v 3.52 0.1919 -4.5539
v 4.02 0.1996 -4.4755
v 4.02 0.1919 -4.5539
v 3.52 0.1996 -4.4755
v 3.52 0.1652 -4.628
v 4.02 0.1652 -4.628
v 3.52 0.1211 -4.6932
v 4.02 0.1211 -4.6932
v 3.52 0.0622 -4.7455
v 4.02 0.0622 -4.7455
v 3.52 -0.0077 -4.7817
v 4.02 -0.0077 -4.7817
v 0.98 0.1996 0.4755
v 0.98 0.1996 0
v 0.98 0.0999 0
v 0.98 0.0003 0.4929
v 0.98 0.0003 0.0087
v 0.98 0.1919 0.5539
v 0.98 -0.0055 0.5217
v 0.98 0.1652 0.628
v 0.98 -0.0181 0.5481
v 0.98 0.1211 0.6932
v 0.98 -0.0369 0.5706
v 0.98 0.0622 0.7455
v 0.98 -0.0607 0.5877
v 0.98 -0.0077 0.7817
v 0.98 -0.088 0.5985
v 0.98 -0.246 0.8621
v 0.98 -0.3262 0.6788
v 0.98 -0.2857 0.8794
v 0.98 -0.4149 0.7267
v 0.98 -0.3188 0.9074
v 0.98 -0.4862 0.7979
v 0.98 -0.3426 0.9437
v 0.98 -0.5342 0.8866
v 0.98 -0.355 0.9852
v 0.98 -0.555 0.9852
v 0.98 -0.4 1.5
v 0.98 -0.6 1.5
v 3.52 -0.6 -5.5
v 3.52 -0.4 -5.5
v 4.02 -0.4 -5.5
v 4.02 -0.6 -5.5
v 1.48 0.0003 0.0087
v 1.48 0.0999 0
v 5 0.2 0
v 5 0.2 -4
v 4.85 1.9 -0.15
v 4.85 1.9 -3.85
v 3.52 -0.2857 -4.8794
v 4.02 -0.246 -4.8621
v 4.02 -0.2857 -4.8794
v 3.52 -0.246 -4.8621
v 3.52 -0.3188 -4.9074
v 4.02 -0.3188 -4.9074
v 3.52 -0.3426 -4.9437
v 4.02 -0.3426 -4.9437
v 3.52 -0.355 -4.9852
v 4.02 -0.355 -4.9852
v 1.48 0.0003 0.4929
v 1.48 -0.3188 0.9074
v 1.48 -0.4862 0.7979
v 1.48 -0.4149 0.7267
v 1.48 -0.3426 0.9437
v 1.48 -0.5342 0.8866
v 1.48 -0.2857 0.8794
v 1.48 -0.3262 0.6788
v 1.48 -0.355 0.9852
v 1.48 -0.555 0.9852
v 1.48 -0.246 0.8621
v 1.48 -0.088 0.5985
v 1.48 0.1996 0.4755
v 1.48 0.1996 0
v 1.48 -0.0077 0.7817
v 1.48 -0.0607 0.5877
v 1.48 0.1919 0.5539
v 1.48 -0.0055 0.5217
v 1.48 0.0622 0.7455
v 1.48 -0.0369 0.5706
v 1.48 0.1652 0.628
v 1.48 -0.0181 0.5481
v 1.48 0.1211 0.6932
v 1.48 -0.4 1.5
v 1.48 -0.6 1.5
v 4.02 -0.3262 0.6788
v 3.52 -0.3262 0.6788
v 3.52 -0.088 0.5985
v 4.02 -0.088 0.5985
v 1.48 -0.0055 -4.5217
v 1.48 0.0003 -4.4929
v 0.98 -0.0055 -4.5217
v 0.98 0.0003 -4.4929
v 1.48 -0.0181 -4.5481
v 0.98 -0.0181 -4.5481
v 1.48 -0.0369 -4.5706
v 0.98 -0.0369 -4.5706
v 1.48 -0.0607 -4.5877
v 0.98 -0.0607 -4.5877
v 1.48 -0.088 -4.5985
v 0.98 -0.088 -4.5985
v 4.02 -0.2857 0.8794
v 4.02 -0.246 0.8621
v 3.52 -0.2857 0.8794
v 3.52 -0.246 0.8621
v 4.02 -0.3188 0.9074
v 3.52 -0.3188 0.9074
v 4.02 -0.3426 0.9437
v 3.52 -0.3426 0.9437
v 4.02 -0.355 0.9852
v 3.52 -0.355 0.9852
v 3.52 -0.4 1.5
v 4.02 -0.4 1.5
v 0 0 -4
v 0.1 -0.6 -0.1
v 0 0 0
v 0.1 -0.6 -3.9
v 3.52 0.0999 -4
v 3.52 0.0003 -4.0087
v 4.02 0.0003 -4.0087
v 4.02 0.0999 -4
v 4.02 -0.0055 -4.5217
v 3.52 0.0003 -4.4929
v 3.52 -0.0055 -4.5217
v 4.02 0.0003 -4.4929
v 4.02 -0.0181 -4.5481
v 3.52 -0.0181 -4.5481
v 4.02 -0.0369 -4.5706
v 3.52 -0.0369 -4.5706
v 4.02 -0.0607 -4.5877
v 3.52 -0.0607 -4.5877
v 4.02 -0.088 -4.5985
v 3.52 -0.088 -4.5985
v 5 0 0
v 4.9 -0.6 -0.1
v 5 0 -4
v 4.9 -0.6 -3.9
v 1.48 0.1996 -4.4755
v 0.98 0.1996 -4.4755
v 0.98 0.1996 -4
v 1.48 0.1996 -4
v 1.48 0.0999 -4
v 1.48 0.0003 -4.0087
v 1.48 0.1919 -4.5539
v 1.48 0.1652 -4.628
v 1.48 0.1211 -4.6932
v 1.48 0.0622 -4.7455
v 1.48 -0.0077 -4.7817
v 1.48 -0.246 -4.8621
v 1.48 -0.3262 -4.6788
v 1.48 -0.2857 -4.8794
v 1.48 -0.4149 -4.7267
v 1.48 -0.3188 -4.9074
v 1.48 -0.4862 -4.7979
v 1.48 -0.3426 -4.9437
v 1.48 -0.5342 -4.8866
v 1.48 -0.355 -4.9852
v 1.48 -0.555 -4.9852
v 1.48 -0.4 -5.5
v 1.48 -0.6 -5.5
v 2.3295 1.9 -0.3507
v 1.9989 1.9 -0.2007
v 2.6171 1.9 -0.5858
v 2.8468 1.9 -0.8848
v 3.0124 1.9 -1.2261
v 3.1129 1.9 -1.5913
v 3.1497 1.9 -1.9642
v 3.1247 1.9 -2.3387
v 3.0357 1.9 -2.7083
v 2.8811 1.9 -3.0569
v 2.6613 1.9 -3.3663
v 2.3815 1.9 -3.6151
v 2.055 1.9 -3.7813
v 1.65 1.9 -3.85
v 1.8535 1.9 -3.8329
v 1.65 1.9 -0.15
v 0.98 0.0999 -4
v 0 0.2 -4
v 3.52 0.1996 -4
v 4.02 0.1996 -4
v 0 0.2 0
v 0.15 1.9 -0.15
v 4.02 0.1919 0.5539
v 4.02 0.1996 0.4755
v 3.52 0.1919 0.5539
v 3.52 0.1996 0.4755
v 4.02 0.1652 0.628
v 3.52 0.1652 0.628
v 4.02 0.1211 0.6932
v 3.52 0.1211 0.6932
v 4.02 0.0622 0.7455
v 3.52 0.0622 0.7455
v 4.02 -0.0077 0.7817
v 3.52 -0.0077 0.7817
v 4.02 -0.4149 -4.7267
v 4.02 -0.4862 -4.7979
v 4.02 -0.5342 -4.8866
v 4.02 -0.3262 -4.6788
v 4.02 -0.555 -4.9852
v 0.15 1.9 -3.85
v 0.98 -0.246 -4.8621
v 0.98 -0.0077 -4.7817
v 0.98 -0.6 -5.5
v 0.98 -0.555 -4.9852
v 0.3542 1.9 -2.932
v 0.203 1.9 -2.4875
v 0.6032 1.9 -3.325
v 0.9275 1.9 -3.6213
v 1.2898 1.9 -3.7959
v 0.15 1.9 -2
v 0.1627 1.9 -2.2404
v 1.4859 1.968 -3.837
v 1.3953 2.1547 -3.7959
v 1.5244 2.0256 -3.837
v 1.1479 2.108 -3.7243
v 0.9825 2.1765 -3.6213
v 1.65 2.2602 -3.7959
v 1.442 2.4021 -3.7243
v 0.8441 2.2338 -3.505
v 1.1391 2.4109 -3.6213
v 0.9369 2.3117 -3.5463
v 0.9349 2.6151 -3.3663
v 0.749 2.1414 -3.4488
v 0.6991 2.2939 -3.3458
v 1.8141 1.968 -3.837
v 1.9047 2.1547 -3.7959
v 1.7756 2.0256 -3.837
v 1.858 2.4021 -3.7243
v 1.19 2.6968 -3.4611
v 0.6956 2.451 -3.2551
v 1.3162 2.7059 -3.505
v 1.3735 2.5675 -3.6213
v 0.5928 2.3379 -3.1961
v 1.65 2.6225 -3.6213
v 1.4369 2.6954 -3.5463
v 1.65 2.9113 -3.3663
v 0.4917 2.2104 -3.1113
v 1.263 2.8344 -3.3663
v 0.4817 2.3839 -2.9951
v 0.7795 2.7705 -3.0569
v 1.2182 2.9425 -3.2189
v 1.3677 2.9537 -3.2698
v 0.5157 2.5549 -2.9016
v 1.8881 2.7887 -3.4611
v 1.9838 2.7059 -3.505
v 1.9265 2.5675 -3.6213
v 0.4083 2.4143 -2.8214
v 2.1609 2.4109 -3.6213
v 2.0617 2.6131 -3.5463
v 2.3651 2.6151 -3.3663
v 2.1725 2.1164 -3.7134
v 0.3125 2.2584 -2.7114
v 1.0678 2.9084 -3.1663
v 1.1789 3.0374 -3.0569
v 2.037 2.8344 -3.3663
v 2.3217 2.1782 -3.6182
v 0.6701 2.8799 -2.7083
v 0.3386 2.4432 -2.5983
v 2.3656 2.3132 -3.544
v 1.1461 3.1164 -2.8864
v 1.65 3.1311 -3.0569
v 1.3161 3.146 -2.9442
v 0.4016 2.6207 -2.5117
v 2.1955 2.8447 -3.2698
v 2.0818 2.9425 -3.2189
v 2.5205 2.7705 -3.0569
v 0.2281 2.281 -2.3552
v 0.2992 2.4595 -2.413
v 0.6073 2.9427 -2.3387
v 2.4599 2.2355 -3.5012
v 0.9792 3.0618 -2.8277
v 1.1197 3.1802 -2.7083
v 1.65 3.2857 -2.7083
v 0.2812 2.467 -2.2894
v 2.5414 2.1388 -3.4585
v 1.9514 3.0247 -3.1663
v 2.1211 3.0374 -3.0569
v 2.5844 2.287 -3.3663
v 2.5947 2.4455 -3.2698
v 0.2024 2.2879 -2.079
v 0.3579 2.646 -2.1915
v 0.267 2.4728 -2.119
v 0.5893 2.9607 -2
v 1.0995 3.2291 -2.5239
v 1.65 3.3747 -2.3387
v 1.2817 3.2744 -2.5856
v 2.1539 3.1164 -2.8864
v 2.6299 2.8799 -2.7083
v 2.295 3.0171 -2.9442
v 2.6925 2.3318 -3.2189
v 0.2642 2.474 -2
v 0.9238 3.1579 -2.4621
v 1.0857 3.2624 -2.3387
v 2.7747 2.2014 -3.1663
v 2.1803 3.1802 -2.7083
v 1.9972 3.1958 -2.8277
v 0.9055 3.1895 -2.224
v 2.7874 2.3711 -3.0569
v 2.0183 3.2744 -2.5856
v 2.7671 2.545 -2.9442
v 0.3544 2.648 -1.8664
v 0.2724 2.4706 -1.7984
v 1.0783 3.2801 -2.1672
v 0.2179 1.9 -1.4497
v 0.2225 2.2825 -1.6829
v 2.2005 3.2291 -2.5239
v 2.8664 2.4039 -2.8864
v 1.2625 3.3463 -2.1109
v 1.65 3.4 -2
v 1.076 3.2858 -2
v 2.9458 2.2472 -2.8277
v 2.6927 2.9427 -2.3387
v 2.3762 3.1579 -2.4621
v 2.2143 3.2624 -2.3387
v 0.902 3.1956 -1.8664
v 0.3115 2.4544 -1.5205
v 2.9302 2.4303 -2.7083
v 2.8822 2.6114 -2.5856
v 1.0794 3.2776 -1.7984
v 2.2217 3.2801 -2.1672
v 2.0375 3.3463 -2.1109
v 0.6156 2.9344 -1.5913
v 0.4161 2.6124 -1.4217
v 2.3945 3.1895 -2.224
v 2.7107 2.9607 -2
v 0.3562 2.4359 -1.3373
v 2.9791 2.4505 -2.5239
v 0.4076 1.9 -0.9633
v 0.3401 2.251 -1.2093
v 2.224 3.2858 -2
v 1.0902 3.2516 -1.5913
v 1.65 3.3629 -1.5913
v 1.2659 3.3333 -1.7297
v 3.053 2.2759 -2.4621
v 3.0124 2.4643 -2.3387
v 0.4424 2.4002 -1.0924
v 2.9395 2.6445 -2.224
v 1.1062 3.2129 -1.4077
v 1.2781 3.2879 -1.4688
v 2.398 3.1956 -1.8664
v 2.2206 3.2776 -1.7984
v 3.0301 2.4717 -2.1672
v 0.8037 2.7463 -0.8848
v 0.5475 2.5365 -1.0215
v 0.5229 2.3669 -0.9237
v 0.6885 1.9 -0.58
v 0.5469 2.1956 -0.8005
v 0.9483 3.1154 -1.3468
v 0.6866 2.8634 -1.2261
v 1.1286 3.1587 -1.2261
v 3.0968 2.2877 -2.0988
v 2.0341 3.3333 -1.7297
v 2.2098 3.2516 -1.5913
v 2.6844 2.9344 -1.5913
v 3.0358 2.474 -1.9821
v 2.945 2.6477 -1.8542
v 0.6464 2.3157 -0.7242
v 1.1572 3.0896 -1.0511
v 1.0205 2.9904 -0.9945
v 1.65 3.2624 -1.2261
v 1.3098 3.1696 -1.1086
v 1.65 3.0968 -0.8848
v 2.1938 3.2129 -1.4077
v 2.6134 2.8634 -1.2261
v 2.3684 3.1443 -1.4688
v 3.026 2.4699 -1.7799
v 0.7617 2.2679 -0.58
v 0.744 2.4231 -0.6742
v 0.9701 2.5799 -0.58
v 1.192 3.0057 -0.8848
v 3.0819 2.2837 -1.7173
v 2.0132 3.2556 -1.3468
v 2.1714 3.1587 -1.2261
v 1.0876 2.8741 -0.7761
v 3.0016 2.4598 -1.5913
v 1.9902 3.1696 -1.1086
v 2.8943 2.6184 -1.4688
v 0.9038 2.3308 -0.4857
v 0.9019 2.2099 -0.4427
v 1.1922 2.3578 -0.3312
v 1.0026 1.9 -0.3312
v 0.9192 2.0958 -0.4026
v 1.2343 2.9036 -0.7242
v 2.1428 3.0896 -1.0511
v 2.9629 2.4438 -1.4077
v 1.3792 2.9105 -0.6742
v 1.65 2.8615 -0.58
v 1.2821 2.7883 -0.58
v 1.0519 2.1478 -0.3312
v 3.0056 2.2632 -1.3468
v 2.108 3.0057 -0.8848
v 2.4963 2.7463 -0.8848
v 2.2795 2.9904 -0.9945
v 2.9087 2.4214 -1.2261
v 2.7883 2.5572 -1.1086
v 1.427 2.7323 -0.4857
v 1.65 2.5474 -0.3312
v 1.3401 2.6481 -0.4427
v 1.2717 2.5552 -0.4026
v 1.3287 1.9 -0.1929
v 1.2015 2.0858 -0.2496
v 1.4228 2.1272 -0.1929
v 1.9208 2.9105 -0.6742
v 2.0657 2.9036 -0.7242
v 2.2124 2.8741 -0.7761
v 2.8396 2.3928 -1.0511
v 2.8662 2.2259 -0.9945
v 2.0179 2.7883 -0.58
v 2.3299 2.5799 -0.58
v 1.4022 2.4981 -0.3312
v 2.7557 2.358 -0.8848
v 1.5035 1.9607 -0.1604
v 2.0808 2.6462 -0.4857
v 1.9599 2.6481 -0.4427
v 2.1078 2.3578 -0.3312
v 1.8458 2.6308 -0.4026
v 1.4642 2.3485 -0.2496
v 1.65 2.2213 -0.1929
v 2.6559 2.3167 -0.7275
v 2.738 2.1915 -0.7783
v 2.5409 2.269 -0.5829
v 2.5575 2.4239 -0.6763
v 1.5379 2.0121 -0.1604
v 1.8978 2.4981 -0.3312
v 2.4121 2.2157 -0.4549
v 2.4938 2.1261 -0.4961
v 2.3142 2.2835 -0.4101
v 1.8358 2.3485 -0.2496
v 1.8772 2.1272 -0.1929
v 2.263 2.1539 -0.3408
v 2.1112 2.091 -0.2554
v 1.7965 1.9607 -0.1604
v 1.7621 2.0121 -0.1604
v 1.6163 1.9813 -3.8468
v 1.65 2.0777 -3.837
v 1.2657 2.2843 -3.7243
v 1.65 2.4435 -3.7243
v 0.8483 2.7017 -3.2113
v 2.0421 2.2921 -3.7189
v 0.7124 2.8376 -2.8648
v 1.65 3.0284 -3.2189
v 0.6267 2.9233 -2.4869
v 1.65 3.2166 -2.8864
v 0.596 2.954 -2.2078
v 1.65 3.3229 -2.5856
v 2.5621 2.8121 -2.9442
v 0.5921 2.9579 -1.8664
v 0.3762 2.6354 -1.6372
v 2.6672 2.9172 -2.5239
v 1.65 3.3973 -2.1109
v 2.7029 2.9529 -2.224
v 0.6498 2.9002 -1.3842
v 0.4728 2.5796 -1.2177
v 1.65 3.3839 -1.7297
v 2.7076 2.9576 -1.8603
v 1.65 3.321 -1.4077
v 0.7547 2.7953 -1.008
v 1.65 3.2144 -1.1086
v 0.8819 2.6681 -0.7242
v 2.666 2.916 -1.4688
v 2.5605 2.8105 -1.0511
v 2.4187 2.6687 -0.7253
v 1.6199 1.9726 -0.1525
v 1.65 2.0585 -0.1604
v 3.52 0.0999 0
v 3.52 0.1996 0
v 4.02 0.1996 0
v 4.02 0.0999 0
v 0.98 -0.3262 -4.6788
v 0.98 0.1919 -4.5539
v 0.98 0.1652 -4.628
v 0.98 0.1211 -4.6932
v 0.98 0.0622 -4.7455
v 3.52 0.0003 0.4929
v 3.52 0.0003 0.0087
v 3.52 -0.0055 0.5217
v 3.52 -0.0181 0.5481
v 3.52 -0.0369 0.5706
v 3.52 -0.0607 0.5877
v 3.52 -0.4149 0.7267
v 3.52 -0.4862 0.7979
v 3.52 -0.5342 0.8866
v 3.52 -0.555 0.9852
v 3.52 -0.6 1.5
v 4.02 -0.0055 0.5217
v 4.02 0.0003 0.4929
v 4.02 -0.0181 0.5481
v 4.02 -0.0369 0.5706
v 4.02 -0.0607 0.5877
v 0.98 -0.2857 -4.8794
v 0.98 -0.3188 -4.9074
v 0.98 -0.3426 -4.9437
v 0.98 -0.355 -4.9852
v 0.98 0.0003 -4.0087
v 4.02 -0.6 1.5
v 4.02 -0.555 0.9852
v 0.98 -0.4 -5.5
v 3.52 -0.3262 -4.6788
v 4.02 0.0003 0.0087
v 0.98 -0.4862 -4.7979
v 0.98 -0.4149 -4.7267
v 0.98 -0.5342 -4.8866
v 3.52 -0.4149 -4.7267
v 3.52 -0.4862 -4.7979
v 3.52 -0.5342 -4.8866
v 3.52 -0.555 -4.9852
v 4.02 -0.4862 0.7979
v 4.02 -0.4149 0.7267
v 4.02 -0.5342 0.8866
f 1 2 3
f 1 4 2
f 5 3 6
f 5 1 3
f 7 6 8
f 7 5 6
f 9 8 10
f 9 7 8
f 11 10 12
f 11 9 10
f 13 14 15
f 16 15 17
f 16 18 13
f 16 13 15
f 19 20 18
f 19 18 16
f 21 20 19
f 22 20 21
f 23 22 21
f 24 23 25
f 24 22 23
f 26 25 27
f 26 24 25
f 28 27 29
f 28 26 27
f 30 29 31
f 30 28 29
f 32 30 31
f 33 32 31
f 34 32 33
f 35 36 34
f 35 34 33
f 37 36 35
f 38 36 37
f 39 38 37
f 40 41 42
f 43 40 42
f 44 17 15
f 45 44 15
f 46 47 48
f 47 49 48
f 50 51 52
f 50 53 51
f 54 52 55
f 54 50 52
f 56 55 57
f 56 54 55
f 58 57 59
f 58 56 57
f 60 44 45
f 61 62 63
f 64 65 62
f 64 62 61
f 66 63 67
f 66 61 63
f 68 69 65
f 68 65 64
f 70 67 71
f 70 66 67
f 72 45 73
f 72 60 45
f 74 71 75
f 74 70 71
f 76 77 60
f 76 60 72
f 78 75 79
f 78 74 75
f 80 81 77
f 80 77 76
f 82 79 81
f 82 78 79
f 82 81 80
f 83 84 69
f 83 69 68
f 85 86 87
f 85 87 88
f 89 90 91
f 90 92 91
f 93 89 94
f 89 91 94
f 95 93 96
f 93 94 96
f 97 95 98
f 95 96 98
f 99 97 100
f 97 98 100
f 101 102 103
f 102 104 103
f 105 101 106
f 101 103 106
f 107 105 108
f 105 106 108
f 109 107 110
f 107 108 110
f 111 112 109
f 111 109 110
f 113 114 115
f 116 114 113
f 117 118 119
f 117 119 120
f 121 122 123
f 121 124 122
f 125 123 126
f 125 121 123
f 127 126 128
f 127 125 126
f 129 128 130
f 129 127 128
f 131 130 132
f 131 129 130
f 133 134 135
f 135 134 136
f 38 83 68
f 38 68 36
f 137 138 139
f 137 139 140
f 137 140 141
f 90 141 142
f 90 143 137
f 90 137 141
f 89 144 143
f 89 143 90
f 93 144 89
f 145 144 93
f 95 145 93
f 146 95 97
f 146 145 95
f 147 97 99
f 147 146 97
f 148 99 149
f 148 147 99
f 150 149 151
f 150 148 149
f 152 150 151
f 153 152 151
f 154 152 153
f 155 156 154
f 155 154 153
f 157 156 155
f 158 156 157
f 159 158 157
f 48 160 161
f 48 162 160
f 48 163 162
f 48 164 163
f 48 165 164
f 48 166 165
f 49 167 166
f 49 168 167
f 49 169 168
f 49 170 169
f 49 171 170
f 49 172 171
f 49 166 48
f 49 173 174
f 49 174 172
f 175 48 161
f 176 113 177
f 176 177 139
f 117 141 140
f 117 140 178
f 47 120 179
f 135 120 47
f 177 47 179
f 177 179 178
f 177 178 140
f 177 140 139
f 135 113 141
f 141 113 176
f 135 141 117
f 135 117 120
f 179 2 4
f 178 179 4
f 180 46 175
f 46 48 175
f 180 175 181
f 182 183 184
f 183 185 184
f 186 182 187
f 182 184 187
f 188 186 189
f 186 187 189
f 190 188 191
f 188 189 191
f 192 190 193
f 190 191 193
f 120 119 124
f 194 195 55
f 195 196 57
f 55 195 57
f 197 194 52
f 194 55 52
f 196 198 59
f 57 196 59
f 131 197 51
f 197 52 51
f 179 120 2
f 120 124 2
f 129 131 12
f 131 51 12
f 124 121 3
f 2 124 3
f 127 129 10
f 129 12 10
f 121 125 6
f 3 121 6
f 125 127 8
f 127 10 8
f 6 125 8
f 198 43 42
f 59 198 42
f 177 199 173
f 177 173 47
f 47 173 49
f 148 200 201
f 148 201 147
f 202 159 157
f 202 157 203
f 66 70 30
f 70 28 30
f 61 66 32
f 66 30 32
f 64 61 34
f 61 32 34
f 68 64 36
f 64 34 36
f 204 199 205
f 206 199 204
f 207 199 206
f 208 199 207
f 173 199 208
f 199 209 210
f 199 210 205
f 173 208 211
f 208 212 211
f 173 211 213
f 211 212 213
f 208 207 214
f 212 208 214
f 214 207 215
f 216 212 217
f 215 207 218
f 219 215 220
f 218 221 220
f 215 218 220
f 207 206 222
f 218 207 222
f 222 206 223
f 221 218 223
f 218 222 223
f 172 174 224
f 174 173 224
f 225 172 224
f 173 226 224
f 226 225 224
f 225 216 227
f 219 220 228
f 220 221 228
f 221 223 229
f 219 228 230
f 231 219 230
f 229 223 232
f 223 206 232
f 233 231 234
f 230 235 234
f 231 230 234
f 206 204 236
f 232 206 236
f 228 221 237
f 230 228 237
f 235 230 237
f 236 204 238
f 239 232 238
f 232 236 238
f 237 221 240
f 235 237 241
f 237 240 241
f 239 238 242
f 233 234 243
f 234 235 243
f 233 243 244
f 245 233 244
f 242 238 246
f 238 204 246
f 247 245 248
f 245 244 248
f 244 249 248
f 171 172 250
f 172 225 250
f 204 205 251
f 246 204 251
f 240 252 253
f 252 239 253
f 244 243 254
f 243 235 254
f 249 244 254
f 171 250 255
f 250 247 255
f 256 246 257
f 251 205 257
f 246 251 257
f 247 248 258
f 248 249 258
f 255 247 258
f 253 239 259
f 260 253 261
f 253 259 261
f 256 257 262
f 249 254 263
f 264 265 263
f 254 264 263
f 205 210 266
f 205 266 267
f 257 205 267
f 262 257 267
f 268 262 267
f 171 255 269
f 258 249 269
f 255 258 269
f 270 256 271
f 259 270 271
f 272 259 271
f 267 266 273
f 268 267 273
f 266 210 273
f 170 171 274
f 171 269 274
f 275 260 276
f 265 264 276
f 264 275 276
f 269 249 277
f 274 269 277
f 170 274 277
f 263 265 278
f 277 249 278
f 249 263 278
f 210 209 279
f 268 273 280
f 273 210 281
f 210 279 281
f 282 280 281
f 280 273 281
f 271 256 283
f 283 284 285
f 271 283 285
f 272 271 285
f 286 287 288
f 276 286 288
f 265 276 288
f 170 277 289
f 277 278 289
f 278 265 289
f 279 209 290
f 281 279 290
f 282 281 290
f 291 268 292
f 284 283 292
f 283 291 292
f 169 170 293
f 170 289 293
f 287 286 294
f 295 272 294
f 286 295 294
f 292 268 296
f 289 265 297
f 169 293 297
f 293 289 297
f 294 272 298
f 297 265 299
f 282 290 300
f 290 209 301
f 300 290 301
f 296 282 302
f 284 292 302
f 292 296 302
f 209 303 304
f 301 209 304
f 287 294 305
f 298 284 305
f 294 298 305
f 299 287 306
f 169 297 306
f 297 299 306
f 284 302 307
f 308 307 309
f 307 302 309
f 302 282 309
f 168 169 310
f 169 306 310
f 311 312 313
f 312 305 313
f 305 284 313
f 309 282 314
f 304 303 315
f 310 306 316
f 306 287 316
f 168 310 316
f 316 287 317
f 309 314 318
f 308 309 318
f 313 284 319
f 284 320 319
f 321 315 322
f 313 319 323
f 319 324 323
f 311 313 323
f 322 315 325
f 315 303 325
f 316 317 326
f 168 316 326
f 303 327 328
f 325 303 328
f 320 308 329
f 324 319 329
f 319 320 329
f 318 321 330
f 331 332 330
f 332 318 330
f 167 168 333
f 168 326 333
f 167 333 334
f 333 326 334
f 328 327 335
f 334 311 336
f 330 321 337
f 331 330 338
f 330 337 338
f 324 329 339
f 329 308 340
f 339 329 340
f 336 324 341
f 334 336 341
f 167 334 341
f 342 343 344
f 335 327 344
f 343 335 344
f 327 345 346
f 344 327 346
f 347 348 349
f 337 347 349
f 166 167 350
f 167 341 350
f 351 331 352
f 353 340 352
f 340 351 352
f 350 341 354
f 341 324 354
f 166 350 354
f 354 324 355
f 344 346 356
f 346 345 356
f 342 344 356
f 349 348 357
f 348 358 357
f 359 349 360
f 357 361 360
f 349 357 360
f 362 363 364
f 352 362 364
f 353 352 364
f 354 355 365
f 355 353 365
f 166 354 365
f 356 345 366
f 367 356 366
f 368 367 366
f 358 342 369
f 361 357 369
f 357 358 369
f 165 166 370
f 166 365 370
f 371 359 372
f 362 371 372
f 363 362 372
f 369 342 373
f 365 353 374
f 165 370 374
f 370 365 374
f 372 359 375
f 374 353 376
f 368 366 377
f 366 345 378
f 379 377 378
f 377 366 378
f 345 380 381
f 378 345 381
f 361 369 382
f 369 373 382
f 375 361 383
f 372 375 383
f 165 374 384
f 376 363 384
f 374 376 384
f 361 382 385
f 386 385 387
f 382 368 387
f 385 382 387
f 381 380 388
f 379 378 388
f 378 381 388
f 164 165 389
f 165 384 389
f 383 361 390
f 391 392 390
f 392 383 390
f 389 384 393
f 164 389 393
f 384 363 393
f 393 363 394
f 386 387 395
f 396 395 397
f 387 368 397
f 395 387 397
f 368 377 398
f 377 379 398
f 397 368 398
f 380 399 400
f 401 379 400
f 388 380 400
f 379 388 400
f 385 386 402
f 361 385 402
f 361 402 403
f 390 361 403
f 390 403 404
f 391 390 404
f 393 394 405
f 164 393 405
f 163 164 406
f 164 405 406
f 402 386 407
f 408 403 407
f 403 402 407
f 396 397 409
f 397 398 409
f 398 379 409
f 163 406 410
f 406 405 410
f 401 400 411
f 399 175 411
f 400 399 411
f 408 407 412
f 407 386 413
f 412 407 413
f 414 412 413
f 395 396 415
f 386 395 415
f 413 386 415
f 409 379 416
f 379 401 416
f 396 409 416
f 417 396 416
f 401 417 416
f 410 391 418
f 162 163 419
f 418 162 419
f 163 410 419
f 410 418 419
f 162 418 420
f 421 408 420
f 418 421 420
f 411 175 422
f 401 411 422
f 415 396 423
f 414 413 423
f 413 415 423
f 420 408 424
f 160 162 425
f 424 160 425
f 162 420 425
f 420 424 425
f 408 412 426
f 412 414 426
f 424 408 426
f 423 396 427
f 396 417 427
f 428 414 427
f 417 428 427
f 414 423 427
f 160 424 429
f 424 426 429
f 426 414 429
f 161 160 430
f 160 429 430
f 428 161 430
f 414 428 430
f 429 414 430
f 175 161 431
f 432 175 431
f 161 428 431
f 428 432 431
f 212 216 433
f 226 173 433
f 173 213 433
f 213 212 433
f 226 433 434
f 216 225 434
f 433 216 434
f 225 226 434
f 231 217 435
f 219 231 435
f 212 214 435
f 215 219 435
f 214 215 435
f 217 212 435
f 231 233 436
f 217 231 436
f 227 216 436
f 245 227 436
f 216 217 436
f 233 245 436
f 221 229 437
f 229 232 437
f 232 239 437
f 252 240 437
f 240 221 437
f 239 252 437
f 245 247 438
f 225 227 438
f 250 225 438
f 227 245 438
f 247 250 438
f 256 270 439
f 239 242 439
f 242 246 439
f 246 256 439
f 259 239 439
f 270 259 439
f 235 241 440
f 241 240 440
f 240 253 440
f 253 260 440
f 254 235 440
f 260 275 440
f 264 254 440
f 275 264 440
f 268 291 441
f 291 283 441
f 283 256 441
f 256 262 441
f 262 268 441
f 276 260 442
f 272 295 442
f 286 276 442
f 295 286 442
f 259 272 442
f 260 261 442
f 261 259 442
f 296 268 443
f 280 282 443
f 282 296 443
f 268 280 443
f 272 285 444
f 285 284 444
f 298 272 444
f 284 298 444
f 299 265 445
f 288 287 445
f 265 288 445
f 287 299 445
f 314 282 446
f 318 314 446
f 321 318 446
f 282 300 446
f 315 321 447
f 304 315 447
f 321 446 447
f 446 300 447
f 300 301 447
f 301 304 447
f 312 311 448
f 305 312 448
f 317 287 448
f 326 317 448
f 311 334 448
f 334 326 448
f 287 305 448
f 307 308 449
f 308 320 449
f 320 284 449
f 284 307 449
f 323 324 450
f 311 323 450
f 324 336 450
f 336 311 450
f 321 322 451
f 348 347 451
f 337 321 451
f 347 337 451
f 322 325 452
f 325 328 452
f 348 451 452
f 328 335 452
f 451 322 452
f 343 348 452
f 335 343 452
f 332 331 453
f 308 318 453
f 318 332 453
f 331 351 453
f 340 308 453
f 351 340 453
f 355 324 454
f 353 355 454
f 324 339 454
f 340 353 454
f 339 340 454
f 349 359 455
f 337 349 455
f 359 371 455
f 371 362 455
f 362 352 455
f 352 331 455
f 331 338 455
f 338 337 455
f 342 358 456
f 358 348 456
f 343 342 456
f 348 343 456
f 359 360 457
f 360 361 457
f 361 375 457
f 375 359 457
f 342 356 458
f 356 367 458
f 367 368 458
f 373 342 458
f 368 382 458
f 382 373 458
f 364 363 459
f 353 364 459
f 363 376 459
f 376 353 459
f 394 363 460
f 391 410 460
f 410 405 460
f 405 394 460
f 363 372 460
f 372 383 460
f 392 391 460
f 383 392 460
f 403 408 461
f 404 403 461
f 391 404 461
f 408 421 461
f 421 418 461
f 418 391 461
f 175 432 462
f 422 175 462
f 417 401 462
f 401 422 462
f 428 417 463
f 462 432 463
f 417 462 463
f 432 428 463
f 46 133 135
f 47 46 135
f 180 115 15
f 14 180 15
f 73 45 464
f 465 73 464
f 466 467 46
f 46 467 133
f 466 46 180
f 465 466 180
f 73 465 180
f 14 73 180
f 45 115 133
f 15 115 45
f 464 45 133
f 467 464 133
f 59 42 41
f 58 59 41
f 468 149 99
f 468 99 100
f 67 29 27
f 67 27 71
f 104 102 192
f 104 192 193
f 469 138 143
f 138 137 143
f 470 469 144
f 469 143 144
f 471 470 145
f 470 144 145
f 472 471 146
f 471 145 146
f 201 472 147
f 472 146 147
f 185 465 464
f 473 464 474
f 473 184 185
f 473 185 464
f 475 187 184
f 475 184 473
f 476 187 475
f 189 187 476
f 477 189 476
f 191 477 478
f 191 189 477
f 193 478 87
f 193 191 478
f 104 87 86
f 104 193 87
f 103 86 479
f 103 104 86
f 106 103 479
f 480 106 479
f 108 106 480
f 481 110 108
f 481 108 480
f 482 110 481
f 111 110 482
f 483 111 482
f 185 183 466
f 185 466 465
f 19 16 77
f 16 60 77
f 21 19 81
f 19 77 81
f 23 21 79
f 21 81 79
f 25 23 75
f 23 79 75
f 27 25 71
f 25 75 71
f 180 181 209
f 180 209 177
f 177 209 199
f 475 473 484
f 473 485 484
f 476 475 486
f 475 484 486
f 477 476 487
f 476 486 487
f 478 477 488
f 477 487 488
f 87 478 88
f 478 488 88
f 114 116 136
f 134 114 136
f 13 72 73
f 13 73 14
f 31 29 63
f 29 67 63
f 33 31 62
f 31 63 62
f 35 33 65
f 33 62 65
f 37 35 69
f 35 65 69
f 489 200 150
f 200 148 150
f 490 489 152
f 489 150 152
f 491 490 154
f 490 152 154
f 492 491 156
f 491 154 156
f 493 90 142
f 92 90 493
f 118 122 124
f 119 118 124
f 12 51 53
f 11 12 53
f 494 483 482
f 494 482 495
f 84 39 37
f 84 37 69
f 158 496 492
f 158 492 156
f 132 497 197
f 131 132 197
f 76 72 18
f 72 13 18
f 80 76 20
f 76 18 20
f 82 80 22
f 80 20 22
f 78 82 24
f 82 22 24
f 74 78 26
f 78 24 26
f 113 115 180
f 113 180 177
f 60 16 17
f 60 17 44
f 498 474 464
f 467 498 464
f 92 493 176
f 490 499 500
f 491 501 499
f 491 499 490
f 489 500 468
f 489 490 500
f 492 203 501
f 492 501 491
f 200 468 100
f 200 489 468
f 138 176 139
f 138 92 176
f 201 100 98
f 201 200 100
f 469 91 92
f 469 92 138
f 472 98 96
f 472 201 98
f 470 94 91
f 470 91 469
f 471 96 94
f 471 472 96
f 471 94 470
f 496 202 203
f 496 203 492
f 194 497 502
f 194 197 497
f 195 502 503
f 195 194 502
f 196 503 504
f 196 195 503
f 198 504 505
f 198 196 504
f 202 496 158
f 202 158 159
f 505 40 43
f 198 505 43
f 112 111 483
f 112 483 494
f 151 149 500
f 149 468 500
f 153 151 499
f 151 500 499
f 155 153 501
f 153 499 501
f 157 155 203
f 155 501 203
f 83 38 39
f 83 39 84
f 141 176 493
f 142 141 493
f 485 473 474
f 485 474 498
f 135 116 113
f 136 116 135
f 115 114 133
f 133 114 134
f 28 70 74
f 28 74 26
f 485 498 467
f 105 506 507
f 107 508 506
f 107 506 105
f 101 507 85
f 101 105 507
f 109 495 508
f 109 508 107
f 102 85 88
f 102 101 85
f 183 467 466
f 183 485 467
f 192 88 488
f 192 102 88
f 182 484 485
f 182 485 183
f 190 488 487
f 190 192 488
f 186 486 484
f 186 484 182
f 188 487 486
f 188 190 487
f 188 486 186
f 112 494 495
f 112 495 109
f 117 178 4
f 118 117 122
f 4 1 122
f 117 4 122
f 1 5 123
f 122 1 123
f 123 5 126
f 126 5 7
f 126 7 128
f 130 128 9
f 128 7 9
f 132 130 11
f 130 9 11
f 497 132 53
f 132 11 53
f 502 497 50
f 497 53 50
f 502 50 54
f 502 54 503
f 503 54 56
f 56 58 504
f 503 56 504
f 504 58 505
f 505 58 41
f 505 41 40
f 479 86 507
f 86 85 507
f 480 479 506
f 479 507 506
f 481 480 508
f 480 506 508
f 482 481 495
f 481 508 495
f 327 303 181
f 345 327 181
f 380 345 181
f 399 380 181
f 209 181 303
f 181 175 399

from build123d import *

# Parameters (mm, degrees)
SKETCH_1_W               = 5
SKETCH_1_H               = 4
EXTRUDE_1_DEPTH          = 0.2
LOFT_3_OUTLINE_W         = 4.8
LOFT_3_OUTLINE_H         = 3.8
LOFT_3_DEPTH             = 0.6
LOFT_3_DRAFT             = -9.4623222
SKETCH_9_W               = 0.5
SKETCH_9_H               = 0.2
PATTERN_LINEAR_1_COUNT   = 2
PATTERN_LINEAR_1_PITCH   = 2.54
MIRROR_1_COPY_1_SKETCH_W = 0.5
MIRROR_1_COPY_1_SKETCH_H = 0.2


# Read off the part's stored shape, not the designer's step: 放样3
with BuildPart() as part:
    # 草图1 → 凸台-拉伸1 (new body)
    with BuildSketch(Plane(origin=(0, 0, 0), x_dir=(1, 0, 0), z_dir=(0, 1, 0))):
        with Locations((2.5, 2)):
            Rectangle(SKETCH_1_W, SKETCH_1_H)
    extrude(amount=EXTRUDE_1_DEPTH)


with BuildPart() as loft_3_tool:
    # 放样3 outline → 放样3 (with draft: the straight prism first)
    with BuildSketch(Plane(origin=(0, -0.6, 0), x_dir=(1, 0, 0), z_dir=(0, 1, 0))):
        with Locations((2.5, 2)):
            Rectangle(LOFT_3_OUTLINE_W, LOFT_3_OUTLINE_H)
    extrude(amount=LOFT_3_DEPTH)
    # 放样3: the draft: its side faces are tilted about the plane it starts from
    loft_3_sides = [loft_3_tool.faces().sort_by_distance(p)[0] for p in [
        (2.5, -0.3, -3.9),
        (0.1, -0.3, -2),
        (2.5, -0.3, -0.1),
        (4.9, -0.3, -2),
    ]]
    draft(loft_3_sides, Plane(origin=(0, -0.6, 0), x_dir=(1, 0, 0), z_dir=(0, 1, 0)), LOFT_3_DRAFT)


with BuildPart() as part_1:
    add(part.part)

    # 放样3: add loft_3_tool
    add(loft_3_tool.part)

    # 草图4 → 放样5 section 0
    with BuildSketch(Plane(origin=(0, 0.2, 0), x_dir=(1, 0, 0), z_dir=(0, 1, 0))):
        with BuildLine():
            Line((0, 4), (5, 4))
            Line((5, 4), (5, 0))
            Line((5, 0), (0, 0))
            Line((0, 0), (0, 4))
        make_face()
    # 草图3 → 放样5 section 1
    with BuildSketch(Plane(origin=(0, 1.9, 0), x_dir=(1, 0, 0), z_dir=(0, 1, 0))):
        with BuildLine():
            Line((0.15, 3.85), (4.85, 3.85))
            Line((4.85, 3.85), (4.85, 0.15))
            Line((4.85, 0.15), (0.15, 0.15))
            Line((0.15, 0.15), (0.15, 3.85))
        make_face()
    loft()

    # 草图6 → 旋转1 (revolve)
    with BuildSketch(Plane(origin=(0, 1.9, 0), x_dir=(1, 0, 0), z_dir=(0, 1, 0))):
        with BuildLine():
            Line((1.65, 3.85), (1.65, 0.15))
            add(Edge.make_bspline(
                [(1.65, 3.85), (0.15, 3.85), (0.15, 2), (0.15, 0.15), (1.65, 0.15)],
                knots=[0, 0, 0, 1.570796327, 1.570796327, 3.141592654, 3.141592654, 3.141592654], degree=2, weights=[1, 0.707106781, 1, 0.707106781, 1]))
        make_face()
    revolve(axis=Axis((1.65, 1.9, 0.373474455), (0, 0, -1)))

    # 扫描2: sweep along a path in 草图7
    with BuildLine(Plane(origin=(3.77, 0, 0), x_dir=(0, 0, -1), z_dir=(1, 0, 0))) as sweep_2_path:
        Line((0, 0.099936428), (-0.484226547, 0.099936428))
        ThreePointArc((-0.484226547, 0.099936428), (-0.610923653, 0.059163591), (-0.690061218, -0.047849619))
        Line((-0.690061218, -0.047849619), (-0.770446454, -0.286097268))
        ThreePointArc((-0.770446454, -0.286097268), (-0.852673785, -0.402517912), (-0.98520599, -0.45496136))
        Line((-0.98520599, -0.45496136), (-1.5, -0.5))
    # 草图9 → 扫描2 (sweep)
    with BuildSketch(Plane.XY.offset(1.5)):
        with Locations((3.77, -0.5)):
            Rectangle(SKETCH_9_W, SKETCH_9_H)
    sweep_2 = sweep(path=sweep_2_path.line)

    # 阵列(线性)1: 扫描2 ×2
    with Locations(*[(-i * PATTERN_LINEAR_1_PITCH, 0, 0) for i in range(1, PATTERN_LINEAR_1_COUNT)]):
        add(sweep_2)

    # 镜向1: 扫描2 across plane
    add(sweep_2.mirror(Plane.XY.offset(-2)))

    # 镜向1 copy 1: sweep along a path in 镜向1 copy 1 path
    with BuildLine(Plane(origin=(1.23, 0, -4), x_dir=(0, 0, 1), z_dir=(1, 0, 0))) as mirror_1_copy_1_path:
        Line((0, -0.099936428), (-0.484226547, -0.099936428))
        ThreePointArc((-0.484226547, -0.099936428), (-0.610923653, -0.059163591), (-0.690061218, 0.047849619))
        Line((-0.690061218, 0.047849619), (-0.770446454, 0.286097268))
        ThreePointArc((-0.770446454, 0.286097268), (-0.852673785, 0.402517912), (-0.98520599, 0.45496136))
        Line((-0.98520599, 0.45496136), (-1.5, 0.5))
    # 镜向1 copy 1 sketch → 镜向1 copy 1 (sweep)
    with BuildSketch(Plane(origin=(-2.54, 0, -5.5), x_dir=(1, 0, 0), z_dir=(0, 0, -1))):
        with Locations((3.77, 0.5)):
            Rectangle(MIRROR_1_COPY_1_SKETCH_W, MIRROR_1_COPY_1_SKETCH_H)
    sweep(path=mirror_1_copy_1_path.line)


solid = part_1.part
